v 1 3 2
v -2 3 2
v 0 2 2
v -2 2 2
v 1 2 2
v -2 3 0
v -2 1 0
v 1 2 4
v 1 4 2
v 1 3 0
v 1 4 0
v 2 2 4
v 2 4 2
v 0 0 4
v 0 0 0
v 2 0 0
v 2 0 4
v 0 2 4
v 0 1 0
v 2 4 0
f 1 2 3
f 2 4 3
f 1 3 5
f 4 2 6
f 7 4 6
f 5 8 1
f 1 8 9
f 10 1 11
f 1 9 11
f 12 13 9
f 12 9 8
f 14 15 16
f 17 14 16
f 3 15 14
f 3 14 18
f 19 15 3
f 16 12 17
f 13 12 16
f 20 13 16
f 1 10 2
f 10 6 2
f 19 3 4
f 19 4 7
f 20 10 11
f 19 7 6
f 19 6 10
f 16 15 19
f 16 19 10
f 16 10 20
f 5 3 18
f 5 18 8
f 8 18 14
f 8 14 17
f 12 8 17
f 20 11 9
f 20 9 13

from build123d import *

# Parameters (mm, degrees)
SKETCH2_W                = 2
SKETCH2_H                = 2
BOSS_EXTRUDE1_DEPTH      = 4
BOSS_EXTRUDE2_DEPTH      = 2
BOSS_EXTRUDE2_DEPTH_BACK = 1
SKETCH4_W                = 1
SKETCH4_H                = 2
BOSS_EXTRUDE3_DEPTH      = 2
BOSS_EXTRUDE4_DEPTH      = 1


with BuildPart() as part:
    # Sketch2 → Boss-Extrude1 (new body)
    with BuildSketch(Plane.XY):
        with Locations((1, 1)):
            Rectangle(SKETCH2_W, SKETCH2_H)
    extrude(amount=BOSS_EXTRUDE1_DEPTH)

    # Sketch3 → Boss-Extrude2 (add, two sides)
    with BuildSketch(Plane.ZY) as boss_extrude2_sk:
        Polygon((0, 1), (0, 3), (2, 3), (2, 2), align=None)
    extrude(amount=BOSS_EXTRUDE2_DEPTH)
    extrude(boss_extrude2_sk.sketch, amount=-BOSS_EXTRUDE2_DEPTH_BACK)

    # Sketch4 → Boss-Extrude3 (add)
    with BuildSketch(Plane(origin=(0, 2, 0), x_dir=(1, 0, 0), z_dir=(0, 1, 0))):
        with Locations((1.5, -1)):
            Rectangle(SKETCH4_W, SKETCH4_H)
    extrude(amount=BOSS_EXTRUDE3_DEPTH)

    # Sketch5 → Boss-Extrude4 (add)
    with BuildSketch(Plane(origin=(2, 0, 0), x_dir=(0, 0, -1), z_dir=(1, 0, 0))):
        Polygon((-2, 4), (-4, 2), (-2, 2), align=None)
    extrude(amount=-BOSS_EXTRUDE4_DEPTH)


solid = part.part
